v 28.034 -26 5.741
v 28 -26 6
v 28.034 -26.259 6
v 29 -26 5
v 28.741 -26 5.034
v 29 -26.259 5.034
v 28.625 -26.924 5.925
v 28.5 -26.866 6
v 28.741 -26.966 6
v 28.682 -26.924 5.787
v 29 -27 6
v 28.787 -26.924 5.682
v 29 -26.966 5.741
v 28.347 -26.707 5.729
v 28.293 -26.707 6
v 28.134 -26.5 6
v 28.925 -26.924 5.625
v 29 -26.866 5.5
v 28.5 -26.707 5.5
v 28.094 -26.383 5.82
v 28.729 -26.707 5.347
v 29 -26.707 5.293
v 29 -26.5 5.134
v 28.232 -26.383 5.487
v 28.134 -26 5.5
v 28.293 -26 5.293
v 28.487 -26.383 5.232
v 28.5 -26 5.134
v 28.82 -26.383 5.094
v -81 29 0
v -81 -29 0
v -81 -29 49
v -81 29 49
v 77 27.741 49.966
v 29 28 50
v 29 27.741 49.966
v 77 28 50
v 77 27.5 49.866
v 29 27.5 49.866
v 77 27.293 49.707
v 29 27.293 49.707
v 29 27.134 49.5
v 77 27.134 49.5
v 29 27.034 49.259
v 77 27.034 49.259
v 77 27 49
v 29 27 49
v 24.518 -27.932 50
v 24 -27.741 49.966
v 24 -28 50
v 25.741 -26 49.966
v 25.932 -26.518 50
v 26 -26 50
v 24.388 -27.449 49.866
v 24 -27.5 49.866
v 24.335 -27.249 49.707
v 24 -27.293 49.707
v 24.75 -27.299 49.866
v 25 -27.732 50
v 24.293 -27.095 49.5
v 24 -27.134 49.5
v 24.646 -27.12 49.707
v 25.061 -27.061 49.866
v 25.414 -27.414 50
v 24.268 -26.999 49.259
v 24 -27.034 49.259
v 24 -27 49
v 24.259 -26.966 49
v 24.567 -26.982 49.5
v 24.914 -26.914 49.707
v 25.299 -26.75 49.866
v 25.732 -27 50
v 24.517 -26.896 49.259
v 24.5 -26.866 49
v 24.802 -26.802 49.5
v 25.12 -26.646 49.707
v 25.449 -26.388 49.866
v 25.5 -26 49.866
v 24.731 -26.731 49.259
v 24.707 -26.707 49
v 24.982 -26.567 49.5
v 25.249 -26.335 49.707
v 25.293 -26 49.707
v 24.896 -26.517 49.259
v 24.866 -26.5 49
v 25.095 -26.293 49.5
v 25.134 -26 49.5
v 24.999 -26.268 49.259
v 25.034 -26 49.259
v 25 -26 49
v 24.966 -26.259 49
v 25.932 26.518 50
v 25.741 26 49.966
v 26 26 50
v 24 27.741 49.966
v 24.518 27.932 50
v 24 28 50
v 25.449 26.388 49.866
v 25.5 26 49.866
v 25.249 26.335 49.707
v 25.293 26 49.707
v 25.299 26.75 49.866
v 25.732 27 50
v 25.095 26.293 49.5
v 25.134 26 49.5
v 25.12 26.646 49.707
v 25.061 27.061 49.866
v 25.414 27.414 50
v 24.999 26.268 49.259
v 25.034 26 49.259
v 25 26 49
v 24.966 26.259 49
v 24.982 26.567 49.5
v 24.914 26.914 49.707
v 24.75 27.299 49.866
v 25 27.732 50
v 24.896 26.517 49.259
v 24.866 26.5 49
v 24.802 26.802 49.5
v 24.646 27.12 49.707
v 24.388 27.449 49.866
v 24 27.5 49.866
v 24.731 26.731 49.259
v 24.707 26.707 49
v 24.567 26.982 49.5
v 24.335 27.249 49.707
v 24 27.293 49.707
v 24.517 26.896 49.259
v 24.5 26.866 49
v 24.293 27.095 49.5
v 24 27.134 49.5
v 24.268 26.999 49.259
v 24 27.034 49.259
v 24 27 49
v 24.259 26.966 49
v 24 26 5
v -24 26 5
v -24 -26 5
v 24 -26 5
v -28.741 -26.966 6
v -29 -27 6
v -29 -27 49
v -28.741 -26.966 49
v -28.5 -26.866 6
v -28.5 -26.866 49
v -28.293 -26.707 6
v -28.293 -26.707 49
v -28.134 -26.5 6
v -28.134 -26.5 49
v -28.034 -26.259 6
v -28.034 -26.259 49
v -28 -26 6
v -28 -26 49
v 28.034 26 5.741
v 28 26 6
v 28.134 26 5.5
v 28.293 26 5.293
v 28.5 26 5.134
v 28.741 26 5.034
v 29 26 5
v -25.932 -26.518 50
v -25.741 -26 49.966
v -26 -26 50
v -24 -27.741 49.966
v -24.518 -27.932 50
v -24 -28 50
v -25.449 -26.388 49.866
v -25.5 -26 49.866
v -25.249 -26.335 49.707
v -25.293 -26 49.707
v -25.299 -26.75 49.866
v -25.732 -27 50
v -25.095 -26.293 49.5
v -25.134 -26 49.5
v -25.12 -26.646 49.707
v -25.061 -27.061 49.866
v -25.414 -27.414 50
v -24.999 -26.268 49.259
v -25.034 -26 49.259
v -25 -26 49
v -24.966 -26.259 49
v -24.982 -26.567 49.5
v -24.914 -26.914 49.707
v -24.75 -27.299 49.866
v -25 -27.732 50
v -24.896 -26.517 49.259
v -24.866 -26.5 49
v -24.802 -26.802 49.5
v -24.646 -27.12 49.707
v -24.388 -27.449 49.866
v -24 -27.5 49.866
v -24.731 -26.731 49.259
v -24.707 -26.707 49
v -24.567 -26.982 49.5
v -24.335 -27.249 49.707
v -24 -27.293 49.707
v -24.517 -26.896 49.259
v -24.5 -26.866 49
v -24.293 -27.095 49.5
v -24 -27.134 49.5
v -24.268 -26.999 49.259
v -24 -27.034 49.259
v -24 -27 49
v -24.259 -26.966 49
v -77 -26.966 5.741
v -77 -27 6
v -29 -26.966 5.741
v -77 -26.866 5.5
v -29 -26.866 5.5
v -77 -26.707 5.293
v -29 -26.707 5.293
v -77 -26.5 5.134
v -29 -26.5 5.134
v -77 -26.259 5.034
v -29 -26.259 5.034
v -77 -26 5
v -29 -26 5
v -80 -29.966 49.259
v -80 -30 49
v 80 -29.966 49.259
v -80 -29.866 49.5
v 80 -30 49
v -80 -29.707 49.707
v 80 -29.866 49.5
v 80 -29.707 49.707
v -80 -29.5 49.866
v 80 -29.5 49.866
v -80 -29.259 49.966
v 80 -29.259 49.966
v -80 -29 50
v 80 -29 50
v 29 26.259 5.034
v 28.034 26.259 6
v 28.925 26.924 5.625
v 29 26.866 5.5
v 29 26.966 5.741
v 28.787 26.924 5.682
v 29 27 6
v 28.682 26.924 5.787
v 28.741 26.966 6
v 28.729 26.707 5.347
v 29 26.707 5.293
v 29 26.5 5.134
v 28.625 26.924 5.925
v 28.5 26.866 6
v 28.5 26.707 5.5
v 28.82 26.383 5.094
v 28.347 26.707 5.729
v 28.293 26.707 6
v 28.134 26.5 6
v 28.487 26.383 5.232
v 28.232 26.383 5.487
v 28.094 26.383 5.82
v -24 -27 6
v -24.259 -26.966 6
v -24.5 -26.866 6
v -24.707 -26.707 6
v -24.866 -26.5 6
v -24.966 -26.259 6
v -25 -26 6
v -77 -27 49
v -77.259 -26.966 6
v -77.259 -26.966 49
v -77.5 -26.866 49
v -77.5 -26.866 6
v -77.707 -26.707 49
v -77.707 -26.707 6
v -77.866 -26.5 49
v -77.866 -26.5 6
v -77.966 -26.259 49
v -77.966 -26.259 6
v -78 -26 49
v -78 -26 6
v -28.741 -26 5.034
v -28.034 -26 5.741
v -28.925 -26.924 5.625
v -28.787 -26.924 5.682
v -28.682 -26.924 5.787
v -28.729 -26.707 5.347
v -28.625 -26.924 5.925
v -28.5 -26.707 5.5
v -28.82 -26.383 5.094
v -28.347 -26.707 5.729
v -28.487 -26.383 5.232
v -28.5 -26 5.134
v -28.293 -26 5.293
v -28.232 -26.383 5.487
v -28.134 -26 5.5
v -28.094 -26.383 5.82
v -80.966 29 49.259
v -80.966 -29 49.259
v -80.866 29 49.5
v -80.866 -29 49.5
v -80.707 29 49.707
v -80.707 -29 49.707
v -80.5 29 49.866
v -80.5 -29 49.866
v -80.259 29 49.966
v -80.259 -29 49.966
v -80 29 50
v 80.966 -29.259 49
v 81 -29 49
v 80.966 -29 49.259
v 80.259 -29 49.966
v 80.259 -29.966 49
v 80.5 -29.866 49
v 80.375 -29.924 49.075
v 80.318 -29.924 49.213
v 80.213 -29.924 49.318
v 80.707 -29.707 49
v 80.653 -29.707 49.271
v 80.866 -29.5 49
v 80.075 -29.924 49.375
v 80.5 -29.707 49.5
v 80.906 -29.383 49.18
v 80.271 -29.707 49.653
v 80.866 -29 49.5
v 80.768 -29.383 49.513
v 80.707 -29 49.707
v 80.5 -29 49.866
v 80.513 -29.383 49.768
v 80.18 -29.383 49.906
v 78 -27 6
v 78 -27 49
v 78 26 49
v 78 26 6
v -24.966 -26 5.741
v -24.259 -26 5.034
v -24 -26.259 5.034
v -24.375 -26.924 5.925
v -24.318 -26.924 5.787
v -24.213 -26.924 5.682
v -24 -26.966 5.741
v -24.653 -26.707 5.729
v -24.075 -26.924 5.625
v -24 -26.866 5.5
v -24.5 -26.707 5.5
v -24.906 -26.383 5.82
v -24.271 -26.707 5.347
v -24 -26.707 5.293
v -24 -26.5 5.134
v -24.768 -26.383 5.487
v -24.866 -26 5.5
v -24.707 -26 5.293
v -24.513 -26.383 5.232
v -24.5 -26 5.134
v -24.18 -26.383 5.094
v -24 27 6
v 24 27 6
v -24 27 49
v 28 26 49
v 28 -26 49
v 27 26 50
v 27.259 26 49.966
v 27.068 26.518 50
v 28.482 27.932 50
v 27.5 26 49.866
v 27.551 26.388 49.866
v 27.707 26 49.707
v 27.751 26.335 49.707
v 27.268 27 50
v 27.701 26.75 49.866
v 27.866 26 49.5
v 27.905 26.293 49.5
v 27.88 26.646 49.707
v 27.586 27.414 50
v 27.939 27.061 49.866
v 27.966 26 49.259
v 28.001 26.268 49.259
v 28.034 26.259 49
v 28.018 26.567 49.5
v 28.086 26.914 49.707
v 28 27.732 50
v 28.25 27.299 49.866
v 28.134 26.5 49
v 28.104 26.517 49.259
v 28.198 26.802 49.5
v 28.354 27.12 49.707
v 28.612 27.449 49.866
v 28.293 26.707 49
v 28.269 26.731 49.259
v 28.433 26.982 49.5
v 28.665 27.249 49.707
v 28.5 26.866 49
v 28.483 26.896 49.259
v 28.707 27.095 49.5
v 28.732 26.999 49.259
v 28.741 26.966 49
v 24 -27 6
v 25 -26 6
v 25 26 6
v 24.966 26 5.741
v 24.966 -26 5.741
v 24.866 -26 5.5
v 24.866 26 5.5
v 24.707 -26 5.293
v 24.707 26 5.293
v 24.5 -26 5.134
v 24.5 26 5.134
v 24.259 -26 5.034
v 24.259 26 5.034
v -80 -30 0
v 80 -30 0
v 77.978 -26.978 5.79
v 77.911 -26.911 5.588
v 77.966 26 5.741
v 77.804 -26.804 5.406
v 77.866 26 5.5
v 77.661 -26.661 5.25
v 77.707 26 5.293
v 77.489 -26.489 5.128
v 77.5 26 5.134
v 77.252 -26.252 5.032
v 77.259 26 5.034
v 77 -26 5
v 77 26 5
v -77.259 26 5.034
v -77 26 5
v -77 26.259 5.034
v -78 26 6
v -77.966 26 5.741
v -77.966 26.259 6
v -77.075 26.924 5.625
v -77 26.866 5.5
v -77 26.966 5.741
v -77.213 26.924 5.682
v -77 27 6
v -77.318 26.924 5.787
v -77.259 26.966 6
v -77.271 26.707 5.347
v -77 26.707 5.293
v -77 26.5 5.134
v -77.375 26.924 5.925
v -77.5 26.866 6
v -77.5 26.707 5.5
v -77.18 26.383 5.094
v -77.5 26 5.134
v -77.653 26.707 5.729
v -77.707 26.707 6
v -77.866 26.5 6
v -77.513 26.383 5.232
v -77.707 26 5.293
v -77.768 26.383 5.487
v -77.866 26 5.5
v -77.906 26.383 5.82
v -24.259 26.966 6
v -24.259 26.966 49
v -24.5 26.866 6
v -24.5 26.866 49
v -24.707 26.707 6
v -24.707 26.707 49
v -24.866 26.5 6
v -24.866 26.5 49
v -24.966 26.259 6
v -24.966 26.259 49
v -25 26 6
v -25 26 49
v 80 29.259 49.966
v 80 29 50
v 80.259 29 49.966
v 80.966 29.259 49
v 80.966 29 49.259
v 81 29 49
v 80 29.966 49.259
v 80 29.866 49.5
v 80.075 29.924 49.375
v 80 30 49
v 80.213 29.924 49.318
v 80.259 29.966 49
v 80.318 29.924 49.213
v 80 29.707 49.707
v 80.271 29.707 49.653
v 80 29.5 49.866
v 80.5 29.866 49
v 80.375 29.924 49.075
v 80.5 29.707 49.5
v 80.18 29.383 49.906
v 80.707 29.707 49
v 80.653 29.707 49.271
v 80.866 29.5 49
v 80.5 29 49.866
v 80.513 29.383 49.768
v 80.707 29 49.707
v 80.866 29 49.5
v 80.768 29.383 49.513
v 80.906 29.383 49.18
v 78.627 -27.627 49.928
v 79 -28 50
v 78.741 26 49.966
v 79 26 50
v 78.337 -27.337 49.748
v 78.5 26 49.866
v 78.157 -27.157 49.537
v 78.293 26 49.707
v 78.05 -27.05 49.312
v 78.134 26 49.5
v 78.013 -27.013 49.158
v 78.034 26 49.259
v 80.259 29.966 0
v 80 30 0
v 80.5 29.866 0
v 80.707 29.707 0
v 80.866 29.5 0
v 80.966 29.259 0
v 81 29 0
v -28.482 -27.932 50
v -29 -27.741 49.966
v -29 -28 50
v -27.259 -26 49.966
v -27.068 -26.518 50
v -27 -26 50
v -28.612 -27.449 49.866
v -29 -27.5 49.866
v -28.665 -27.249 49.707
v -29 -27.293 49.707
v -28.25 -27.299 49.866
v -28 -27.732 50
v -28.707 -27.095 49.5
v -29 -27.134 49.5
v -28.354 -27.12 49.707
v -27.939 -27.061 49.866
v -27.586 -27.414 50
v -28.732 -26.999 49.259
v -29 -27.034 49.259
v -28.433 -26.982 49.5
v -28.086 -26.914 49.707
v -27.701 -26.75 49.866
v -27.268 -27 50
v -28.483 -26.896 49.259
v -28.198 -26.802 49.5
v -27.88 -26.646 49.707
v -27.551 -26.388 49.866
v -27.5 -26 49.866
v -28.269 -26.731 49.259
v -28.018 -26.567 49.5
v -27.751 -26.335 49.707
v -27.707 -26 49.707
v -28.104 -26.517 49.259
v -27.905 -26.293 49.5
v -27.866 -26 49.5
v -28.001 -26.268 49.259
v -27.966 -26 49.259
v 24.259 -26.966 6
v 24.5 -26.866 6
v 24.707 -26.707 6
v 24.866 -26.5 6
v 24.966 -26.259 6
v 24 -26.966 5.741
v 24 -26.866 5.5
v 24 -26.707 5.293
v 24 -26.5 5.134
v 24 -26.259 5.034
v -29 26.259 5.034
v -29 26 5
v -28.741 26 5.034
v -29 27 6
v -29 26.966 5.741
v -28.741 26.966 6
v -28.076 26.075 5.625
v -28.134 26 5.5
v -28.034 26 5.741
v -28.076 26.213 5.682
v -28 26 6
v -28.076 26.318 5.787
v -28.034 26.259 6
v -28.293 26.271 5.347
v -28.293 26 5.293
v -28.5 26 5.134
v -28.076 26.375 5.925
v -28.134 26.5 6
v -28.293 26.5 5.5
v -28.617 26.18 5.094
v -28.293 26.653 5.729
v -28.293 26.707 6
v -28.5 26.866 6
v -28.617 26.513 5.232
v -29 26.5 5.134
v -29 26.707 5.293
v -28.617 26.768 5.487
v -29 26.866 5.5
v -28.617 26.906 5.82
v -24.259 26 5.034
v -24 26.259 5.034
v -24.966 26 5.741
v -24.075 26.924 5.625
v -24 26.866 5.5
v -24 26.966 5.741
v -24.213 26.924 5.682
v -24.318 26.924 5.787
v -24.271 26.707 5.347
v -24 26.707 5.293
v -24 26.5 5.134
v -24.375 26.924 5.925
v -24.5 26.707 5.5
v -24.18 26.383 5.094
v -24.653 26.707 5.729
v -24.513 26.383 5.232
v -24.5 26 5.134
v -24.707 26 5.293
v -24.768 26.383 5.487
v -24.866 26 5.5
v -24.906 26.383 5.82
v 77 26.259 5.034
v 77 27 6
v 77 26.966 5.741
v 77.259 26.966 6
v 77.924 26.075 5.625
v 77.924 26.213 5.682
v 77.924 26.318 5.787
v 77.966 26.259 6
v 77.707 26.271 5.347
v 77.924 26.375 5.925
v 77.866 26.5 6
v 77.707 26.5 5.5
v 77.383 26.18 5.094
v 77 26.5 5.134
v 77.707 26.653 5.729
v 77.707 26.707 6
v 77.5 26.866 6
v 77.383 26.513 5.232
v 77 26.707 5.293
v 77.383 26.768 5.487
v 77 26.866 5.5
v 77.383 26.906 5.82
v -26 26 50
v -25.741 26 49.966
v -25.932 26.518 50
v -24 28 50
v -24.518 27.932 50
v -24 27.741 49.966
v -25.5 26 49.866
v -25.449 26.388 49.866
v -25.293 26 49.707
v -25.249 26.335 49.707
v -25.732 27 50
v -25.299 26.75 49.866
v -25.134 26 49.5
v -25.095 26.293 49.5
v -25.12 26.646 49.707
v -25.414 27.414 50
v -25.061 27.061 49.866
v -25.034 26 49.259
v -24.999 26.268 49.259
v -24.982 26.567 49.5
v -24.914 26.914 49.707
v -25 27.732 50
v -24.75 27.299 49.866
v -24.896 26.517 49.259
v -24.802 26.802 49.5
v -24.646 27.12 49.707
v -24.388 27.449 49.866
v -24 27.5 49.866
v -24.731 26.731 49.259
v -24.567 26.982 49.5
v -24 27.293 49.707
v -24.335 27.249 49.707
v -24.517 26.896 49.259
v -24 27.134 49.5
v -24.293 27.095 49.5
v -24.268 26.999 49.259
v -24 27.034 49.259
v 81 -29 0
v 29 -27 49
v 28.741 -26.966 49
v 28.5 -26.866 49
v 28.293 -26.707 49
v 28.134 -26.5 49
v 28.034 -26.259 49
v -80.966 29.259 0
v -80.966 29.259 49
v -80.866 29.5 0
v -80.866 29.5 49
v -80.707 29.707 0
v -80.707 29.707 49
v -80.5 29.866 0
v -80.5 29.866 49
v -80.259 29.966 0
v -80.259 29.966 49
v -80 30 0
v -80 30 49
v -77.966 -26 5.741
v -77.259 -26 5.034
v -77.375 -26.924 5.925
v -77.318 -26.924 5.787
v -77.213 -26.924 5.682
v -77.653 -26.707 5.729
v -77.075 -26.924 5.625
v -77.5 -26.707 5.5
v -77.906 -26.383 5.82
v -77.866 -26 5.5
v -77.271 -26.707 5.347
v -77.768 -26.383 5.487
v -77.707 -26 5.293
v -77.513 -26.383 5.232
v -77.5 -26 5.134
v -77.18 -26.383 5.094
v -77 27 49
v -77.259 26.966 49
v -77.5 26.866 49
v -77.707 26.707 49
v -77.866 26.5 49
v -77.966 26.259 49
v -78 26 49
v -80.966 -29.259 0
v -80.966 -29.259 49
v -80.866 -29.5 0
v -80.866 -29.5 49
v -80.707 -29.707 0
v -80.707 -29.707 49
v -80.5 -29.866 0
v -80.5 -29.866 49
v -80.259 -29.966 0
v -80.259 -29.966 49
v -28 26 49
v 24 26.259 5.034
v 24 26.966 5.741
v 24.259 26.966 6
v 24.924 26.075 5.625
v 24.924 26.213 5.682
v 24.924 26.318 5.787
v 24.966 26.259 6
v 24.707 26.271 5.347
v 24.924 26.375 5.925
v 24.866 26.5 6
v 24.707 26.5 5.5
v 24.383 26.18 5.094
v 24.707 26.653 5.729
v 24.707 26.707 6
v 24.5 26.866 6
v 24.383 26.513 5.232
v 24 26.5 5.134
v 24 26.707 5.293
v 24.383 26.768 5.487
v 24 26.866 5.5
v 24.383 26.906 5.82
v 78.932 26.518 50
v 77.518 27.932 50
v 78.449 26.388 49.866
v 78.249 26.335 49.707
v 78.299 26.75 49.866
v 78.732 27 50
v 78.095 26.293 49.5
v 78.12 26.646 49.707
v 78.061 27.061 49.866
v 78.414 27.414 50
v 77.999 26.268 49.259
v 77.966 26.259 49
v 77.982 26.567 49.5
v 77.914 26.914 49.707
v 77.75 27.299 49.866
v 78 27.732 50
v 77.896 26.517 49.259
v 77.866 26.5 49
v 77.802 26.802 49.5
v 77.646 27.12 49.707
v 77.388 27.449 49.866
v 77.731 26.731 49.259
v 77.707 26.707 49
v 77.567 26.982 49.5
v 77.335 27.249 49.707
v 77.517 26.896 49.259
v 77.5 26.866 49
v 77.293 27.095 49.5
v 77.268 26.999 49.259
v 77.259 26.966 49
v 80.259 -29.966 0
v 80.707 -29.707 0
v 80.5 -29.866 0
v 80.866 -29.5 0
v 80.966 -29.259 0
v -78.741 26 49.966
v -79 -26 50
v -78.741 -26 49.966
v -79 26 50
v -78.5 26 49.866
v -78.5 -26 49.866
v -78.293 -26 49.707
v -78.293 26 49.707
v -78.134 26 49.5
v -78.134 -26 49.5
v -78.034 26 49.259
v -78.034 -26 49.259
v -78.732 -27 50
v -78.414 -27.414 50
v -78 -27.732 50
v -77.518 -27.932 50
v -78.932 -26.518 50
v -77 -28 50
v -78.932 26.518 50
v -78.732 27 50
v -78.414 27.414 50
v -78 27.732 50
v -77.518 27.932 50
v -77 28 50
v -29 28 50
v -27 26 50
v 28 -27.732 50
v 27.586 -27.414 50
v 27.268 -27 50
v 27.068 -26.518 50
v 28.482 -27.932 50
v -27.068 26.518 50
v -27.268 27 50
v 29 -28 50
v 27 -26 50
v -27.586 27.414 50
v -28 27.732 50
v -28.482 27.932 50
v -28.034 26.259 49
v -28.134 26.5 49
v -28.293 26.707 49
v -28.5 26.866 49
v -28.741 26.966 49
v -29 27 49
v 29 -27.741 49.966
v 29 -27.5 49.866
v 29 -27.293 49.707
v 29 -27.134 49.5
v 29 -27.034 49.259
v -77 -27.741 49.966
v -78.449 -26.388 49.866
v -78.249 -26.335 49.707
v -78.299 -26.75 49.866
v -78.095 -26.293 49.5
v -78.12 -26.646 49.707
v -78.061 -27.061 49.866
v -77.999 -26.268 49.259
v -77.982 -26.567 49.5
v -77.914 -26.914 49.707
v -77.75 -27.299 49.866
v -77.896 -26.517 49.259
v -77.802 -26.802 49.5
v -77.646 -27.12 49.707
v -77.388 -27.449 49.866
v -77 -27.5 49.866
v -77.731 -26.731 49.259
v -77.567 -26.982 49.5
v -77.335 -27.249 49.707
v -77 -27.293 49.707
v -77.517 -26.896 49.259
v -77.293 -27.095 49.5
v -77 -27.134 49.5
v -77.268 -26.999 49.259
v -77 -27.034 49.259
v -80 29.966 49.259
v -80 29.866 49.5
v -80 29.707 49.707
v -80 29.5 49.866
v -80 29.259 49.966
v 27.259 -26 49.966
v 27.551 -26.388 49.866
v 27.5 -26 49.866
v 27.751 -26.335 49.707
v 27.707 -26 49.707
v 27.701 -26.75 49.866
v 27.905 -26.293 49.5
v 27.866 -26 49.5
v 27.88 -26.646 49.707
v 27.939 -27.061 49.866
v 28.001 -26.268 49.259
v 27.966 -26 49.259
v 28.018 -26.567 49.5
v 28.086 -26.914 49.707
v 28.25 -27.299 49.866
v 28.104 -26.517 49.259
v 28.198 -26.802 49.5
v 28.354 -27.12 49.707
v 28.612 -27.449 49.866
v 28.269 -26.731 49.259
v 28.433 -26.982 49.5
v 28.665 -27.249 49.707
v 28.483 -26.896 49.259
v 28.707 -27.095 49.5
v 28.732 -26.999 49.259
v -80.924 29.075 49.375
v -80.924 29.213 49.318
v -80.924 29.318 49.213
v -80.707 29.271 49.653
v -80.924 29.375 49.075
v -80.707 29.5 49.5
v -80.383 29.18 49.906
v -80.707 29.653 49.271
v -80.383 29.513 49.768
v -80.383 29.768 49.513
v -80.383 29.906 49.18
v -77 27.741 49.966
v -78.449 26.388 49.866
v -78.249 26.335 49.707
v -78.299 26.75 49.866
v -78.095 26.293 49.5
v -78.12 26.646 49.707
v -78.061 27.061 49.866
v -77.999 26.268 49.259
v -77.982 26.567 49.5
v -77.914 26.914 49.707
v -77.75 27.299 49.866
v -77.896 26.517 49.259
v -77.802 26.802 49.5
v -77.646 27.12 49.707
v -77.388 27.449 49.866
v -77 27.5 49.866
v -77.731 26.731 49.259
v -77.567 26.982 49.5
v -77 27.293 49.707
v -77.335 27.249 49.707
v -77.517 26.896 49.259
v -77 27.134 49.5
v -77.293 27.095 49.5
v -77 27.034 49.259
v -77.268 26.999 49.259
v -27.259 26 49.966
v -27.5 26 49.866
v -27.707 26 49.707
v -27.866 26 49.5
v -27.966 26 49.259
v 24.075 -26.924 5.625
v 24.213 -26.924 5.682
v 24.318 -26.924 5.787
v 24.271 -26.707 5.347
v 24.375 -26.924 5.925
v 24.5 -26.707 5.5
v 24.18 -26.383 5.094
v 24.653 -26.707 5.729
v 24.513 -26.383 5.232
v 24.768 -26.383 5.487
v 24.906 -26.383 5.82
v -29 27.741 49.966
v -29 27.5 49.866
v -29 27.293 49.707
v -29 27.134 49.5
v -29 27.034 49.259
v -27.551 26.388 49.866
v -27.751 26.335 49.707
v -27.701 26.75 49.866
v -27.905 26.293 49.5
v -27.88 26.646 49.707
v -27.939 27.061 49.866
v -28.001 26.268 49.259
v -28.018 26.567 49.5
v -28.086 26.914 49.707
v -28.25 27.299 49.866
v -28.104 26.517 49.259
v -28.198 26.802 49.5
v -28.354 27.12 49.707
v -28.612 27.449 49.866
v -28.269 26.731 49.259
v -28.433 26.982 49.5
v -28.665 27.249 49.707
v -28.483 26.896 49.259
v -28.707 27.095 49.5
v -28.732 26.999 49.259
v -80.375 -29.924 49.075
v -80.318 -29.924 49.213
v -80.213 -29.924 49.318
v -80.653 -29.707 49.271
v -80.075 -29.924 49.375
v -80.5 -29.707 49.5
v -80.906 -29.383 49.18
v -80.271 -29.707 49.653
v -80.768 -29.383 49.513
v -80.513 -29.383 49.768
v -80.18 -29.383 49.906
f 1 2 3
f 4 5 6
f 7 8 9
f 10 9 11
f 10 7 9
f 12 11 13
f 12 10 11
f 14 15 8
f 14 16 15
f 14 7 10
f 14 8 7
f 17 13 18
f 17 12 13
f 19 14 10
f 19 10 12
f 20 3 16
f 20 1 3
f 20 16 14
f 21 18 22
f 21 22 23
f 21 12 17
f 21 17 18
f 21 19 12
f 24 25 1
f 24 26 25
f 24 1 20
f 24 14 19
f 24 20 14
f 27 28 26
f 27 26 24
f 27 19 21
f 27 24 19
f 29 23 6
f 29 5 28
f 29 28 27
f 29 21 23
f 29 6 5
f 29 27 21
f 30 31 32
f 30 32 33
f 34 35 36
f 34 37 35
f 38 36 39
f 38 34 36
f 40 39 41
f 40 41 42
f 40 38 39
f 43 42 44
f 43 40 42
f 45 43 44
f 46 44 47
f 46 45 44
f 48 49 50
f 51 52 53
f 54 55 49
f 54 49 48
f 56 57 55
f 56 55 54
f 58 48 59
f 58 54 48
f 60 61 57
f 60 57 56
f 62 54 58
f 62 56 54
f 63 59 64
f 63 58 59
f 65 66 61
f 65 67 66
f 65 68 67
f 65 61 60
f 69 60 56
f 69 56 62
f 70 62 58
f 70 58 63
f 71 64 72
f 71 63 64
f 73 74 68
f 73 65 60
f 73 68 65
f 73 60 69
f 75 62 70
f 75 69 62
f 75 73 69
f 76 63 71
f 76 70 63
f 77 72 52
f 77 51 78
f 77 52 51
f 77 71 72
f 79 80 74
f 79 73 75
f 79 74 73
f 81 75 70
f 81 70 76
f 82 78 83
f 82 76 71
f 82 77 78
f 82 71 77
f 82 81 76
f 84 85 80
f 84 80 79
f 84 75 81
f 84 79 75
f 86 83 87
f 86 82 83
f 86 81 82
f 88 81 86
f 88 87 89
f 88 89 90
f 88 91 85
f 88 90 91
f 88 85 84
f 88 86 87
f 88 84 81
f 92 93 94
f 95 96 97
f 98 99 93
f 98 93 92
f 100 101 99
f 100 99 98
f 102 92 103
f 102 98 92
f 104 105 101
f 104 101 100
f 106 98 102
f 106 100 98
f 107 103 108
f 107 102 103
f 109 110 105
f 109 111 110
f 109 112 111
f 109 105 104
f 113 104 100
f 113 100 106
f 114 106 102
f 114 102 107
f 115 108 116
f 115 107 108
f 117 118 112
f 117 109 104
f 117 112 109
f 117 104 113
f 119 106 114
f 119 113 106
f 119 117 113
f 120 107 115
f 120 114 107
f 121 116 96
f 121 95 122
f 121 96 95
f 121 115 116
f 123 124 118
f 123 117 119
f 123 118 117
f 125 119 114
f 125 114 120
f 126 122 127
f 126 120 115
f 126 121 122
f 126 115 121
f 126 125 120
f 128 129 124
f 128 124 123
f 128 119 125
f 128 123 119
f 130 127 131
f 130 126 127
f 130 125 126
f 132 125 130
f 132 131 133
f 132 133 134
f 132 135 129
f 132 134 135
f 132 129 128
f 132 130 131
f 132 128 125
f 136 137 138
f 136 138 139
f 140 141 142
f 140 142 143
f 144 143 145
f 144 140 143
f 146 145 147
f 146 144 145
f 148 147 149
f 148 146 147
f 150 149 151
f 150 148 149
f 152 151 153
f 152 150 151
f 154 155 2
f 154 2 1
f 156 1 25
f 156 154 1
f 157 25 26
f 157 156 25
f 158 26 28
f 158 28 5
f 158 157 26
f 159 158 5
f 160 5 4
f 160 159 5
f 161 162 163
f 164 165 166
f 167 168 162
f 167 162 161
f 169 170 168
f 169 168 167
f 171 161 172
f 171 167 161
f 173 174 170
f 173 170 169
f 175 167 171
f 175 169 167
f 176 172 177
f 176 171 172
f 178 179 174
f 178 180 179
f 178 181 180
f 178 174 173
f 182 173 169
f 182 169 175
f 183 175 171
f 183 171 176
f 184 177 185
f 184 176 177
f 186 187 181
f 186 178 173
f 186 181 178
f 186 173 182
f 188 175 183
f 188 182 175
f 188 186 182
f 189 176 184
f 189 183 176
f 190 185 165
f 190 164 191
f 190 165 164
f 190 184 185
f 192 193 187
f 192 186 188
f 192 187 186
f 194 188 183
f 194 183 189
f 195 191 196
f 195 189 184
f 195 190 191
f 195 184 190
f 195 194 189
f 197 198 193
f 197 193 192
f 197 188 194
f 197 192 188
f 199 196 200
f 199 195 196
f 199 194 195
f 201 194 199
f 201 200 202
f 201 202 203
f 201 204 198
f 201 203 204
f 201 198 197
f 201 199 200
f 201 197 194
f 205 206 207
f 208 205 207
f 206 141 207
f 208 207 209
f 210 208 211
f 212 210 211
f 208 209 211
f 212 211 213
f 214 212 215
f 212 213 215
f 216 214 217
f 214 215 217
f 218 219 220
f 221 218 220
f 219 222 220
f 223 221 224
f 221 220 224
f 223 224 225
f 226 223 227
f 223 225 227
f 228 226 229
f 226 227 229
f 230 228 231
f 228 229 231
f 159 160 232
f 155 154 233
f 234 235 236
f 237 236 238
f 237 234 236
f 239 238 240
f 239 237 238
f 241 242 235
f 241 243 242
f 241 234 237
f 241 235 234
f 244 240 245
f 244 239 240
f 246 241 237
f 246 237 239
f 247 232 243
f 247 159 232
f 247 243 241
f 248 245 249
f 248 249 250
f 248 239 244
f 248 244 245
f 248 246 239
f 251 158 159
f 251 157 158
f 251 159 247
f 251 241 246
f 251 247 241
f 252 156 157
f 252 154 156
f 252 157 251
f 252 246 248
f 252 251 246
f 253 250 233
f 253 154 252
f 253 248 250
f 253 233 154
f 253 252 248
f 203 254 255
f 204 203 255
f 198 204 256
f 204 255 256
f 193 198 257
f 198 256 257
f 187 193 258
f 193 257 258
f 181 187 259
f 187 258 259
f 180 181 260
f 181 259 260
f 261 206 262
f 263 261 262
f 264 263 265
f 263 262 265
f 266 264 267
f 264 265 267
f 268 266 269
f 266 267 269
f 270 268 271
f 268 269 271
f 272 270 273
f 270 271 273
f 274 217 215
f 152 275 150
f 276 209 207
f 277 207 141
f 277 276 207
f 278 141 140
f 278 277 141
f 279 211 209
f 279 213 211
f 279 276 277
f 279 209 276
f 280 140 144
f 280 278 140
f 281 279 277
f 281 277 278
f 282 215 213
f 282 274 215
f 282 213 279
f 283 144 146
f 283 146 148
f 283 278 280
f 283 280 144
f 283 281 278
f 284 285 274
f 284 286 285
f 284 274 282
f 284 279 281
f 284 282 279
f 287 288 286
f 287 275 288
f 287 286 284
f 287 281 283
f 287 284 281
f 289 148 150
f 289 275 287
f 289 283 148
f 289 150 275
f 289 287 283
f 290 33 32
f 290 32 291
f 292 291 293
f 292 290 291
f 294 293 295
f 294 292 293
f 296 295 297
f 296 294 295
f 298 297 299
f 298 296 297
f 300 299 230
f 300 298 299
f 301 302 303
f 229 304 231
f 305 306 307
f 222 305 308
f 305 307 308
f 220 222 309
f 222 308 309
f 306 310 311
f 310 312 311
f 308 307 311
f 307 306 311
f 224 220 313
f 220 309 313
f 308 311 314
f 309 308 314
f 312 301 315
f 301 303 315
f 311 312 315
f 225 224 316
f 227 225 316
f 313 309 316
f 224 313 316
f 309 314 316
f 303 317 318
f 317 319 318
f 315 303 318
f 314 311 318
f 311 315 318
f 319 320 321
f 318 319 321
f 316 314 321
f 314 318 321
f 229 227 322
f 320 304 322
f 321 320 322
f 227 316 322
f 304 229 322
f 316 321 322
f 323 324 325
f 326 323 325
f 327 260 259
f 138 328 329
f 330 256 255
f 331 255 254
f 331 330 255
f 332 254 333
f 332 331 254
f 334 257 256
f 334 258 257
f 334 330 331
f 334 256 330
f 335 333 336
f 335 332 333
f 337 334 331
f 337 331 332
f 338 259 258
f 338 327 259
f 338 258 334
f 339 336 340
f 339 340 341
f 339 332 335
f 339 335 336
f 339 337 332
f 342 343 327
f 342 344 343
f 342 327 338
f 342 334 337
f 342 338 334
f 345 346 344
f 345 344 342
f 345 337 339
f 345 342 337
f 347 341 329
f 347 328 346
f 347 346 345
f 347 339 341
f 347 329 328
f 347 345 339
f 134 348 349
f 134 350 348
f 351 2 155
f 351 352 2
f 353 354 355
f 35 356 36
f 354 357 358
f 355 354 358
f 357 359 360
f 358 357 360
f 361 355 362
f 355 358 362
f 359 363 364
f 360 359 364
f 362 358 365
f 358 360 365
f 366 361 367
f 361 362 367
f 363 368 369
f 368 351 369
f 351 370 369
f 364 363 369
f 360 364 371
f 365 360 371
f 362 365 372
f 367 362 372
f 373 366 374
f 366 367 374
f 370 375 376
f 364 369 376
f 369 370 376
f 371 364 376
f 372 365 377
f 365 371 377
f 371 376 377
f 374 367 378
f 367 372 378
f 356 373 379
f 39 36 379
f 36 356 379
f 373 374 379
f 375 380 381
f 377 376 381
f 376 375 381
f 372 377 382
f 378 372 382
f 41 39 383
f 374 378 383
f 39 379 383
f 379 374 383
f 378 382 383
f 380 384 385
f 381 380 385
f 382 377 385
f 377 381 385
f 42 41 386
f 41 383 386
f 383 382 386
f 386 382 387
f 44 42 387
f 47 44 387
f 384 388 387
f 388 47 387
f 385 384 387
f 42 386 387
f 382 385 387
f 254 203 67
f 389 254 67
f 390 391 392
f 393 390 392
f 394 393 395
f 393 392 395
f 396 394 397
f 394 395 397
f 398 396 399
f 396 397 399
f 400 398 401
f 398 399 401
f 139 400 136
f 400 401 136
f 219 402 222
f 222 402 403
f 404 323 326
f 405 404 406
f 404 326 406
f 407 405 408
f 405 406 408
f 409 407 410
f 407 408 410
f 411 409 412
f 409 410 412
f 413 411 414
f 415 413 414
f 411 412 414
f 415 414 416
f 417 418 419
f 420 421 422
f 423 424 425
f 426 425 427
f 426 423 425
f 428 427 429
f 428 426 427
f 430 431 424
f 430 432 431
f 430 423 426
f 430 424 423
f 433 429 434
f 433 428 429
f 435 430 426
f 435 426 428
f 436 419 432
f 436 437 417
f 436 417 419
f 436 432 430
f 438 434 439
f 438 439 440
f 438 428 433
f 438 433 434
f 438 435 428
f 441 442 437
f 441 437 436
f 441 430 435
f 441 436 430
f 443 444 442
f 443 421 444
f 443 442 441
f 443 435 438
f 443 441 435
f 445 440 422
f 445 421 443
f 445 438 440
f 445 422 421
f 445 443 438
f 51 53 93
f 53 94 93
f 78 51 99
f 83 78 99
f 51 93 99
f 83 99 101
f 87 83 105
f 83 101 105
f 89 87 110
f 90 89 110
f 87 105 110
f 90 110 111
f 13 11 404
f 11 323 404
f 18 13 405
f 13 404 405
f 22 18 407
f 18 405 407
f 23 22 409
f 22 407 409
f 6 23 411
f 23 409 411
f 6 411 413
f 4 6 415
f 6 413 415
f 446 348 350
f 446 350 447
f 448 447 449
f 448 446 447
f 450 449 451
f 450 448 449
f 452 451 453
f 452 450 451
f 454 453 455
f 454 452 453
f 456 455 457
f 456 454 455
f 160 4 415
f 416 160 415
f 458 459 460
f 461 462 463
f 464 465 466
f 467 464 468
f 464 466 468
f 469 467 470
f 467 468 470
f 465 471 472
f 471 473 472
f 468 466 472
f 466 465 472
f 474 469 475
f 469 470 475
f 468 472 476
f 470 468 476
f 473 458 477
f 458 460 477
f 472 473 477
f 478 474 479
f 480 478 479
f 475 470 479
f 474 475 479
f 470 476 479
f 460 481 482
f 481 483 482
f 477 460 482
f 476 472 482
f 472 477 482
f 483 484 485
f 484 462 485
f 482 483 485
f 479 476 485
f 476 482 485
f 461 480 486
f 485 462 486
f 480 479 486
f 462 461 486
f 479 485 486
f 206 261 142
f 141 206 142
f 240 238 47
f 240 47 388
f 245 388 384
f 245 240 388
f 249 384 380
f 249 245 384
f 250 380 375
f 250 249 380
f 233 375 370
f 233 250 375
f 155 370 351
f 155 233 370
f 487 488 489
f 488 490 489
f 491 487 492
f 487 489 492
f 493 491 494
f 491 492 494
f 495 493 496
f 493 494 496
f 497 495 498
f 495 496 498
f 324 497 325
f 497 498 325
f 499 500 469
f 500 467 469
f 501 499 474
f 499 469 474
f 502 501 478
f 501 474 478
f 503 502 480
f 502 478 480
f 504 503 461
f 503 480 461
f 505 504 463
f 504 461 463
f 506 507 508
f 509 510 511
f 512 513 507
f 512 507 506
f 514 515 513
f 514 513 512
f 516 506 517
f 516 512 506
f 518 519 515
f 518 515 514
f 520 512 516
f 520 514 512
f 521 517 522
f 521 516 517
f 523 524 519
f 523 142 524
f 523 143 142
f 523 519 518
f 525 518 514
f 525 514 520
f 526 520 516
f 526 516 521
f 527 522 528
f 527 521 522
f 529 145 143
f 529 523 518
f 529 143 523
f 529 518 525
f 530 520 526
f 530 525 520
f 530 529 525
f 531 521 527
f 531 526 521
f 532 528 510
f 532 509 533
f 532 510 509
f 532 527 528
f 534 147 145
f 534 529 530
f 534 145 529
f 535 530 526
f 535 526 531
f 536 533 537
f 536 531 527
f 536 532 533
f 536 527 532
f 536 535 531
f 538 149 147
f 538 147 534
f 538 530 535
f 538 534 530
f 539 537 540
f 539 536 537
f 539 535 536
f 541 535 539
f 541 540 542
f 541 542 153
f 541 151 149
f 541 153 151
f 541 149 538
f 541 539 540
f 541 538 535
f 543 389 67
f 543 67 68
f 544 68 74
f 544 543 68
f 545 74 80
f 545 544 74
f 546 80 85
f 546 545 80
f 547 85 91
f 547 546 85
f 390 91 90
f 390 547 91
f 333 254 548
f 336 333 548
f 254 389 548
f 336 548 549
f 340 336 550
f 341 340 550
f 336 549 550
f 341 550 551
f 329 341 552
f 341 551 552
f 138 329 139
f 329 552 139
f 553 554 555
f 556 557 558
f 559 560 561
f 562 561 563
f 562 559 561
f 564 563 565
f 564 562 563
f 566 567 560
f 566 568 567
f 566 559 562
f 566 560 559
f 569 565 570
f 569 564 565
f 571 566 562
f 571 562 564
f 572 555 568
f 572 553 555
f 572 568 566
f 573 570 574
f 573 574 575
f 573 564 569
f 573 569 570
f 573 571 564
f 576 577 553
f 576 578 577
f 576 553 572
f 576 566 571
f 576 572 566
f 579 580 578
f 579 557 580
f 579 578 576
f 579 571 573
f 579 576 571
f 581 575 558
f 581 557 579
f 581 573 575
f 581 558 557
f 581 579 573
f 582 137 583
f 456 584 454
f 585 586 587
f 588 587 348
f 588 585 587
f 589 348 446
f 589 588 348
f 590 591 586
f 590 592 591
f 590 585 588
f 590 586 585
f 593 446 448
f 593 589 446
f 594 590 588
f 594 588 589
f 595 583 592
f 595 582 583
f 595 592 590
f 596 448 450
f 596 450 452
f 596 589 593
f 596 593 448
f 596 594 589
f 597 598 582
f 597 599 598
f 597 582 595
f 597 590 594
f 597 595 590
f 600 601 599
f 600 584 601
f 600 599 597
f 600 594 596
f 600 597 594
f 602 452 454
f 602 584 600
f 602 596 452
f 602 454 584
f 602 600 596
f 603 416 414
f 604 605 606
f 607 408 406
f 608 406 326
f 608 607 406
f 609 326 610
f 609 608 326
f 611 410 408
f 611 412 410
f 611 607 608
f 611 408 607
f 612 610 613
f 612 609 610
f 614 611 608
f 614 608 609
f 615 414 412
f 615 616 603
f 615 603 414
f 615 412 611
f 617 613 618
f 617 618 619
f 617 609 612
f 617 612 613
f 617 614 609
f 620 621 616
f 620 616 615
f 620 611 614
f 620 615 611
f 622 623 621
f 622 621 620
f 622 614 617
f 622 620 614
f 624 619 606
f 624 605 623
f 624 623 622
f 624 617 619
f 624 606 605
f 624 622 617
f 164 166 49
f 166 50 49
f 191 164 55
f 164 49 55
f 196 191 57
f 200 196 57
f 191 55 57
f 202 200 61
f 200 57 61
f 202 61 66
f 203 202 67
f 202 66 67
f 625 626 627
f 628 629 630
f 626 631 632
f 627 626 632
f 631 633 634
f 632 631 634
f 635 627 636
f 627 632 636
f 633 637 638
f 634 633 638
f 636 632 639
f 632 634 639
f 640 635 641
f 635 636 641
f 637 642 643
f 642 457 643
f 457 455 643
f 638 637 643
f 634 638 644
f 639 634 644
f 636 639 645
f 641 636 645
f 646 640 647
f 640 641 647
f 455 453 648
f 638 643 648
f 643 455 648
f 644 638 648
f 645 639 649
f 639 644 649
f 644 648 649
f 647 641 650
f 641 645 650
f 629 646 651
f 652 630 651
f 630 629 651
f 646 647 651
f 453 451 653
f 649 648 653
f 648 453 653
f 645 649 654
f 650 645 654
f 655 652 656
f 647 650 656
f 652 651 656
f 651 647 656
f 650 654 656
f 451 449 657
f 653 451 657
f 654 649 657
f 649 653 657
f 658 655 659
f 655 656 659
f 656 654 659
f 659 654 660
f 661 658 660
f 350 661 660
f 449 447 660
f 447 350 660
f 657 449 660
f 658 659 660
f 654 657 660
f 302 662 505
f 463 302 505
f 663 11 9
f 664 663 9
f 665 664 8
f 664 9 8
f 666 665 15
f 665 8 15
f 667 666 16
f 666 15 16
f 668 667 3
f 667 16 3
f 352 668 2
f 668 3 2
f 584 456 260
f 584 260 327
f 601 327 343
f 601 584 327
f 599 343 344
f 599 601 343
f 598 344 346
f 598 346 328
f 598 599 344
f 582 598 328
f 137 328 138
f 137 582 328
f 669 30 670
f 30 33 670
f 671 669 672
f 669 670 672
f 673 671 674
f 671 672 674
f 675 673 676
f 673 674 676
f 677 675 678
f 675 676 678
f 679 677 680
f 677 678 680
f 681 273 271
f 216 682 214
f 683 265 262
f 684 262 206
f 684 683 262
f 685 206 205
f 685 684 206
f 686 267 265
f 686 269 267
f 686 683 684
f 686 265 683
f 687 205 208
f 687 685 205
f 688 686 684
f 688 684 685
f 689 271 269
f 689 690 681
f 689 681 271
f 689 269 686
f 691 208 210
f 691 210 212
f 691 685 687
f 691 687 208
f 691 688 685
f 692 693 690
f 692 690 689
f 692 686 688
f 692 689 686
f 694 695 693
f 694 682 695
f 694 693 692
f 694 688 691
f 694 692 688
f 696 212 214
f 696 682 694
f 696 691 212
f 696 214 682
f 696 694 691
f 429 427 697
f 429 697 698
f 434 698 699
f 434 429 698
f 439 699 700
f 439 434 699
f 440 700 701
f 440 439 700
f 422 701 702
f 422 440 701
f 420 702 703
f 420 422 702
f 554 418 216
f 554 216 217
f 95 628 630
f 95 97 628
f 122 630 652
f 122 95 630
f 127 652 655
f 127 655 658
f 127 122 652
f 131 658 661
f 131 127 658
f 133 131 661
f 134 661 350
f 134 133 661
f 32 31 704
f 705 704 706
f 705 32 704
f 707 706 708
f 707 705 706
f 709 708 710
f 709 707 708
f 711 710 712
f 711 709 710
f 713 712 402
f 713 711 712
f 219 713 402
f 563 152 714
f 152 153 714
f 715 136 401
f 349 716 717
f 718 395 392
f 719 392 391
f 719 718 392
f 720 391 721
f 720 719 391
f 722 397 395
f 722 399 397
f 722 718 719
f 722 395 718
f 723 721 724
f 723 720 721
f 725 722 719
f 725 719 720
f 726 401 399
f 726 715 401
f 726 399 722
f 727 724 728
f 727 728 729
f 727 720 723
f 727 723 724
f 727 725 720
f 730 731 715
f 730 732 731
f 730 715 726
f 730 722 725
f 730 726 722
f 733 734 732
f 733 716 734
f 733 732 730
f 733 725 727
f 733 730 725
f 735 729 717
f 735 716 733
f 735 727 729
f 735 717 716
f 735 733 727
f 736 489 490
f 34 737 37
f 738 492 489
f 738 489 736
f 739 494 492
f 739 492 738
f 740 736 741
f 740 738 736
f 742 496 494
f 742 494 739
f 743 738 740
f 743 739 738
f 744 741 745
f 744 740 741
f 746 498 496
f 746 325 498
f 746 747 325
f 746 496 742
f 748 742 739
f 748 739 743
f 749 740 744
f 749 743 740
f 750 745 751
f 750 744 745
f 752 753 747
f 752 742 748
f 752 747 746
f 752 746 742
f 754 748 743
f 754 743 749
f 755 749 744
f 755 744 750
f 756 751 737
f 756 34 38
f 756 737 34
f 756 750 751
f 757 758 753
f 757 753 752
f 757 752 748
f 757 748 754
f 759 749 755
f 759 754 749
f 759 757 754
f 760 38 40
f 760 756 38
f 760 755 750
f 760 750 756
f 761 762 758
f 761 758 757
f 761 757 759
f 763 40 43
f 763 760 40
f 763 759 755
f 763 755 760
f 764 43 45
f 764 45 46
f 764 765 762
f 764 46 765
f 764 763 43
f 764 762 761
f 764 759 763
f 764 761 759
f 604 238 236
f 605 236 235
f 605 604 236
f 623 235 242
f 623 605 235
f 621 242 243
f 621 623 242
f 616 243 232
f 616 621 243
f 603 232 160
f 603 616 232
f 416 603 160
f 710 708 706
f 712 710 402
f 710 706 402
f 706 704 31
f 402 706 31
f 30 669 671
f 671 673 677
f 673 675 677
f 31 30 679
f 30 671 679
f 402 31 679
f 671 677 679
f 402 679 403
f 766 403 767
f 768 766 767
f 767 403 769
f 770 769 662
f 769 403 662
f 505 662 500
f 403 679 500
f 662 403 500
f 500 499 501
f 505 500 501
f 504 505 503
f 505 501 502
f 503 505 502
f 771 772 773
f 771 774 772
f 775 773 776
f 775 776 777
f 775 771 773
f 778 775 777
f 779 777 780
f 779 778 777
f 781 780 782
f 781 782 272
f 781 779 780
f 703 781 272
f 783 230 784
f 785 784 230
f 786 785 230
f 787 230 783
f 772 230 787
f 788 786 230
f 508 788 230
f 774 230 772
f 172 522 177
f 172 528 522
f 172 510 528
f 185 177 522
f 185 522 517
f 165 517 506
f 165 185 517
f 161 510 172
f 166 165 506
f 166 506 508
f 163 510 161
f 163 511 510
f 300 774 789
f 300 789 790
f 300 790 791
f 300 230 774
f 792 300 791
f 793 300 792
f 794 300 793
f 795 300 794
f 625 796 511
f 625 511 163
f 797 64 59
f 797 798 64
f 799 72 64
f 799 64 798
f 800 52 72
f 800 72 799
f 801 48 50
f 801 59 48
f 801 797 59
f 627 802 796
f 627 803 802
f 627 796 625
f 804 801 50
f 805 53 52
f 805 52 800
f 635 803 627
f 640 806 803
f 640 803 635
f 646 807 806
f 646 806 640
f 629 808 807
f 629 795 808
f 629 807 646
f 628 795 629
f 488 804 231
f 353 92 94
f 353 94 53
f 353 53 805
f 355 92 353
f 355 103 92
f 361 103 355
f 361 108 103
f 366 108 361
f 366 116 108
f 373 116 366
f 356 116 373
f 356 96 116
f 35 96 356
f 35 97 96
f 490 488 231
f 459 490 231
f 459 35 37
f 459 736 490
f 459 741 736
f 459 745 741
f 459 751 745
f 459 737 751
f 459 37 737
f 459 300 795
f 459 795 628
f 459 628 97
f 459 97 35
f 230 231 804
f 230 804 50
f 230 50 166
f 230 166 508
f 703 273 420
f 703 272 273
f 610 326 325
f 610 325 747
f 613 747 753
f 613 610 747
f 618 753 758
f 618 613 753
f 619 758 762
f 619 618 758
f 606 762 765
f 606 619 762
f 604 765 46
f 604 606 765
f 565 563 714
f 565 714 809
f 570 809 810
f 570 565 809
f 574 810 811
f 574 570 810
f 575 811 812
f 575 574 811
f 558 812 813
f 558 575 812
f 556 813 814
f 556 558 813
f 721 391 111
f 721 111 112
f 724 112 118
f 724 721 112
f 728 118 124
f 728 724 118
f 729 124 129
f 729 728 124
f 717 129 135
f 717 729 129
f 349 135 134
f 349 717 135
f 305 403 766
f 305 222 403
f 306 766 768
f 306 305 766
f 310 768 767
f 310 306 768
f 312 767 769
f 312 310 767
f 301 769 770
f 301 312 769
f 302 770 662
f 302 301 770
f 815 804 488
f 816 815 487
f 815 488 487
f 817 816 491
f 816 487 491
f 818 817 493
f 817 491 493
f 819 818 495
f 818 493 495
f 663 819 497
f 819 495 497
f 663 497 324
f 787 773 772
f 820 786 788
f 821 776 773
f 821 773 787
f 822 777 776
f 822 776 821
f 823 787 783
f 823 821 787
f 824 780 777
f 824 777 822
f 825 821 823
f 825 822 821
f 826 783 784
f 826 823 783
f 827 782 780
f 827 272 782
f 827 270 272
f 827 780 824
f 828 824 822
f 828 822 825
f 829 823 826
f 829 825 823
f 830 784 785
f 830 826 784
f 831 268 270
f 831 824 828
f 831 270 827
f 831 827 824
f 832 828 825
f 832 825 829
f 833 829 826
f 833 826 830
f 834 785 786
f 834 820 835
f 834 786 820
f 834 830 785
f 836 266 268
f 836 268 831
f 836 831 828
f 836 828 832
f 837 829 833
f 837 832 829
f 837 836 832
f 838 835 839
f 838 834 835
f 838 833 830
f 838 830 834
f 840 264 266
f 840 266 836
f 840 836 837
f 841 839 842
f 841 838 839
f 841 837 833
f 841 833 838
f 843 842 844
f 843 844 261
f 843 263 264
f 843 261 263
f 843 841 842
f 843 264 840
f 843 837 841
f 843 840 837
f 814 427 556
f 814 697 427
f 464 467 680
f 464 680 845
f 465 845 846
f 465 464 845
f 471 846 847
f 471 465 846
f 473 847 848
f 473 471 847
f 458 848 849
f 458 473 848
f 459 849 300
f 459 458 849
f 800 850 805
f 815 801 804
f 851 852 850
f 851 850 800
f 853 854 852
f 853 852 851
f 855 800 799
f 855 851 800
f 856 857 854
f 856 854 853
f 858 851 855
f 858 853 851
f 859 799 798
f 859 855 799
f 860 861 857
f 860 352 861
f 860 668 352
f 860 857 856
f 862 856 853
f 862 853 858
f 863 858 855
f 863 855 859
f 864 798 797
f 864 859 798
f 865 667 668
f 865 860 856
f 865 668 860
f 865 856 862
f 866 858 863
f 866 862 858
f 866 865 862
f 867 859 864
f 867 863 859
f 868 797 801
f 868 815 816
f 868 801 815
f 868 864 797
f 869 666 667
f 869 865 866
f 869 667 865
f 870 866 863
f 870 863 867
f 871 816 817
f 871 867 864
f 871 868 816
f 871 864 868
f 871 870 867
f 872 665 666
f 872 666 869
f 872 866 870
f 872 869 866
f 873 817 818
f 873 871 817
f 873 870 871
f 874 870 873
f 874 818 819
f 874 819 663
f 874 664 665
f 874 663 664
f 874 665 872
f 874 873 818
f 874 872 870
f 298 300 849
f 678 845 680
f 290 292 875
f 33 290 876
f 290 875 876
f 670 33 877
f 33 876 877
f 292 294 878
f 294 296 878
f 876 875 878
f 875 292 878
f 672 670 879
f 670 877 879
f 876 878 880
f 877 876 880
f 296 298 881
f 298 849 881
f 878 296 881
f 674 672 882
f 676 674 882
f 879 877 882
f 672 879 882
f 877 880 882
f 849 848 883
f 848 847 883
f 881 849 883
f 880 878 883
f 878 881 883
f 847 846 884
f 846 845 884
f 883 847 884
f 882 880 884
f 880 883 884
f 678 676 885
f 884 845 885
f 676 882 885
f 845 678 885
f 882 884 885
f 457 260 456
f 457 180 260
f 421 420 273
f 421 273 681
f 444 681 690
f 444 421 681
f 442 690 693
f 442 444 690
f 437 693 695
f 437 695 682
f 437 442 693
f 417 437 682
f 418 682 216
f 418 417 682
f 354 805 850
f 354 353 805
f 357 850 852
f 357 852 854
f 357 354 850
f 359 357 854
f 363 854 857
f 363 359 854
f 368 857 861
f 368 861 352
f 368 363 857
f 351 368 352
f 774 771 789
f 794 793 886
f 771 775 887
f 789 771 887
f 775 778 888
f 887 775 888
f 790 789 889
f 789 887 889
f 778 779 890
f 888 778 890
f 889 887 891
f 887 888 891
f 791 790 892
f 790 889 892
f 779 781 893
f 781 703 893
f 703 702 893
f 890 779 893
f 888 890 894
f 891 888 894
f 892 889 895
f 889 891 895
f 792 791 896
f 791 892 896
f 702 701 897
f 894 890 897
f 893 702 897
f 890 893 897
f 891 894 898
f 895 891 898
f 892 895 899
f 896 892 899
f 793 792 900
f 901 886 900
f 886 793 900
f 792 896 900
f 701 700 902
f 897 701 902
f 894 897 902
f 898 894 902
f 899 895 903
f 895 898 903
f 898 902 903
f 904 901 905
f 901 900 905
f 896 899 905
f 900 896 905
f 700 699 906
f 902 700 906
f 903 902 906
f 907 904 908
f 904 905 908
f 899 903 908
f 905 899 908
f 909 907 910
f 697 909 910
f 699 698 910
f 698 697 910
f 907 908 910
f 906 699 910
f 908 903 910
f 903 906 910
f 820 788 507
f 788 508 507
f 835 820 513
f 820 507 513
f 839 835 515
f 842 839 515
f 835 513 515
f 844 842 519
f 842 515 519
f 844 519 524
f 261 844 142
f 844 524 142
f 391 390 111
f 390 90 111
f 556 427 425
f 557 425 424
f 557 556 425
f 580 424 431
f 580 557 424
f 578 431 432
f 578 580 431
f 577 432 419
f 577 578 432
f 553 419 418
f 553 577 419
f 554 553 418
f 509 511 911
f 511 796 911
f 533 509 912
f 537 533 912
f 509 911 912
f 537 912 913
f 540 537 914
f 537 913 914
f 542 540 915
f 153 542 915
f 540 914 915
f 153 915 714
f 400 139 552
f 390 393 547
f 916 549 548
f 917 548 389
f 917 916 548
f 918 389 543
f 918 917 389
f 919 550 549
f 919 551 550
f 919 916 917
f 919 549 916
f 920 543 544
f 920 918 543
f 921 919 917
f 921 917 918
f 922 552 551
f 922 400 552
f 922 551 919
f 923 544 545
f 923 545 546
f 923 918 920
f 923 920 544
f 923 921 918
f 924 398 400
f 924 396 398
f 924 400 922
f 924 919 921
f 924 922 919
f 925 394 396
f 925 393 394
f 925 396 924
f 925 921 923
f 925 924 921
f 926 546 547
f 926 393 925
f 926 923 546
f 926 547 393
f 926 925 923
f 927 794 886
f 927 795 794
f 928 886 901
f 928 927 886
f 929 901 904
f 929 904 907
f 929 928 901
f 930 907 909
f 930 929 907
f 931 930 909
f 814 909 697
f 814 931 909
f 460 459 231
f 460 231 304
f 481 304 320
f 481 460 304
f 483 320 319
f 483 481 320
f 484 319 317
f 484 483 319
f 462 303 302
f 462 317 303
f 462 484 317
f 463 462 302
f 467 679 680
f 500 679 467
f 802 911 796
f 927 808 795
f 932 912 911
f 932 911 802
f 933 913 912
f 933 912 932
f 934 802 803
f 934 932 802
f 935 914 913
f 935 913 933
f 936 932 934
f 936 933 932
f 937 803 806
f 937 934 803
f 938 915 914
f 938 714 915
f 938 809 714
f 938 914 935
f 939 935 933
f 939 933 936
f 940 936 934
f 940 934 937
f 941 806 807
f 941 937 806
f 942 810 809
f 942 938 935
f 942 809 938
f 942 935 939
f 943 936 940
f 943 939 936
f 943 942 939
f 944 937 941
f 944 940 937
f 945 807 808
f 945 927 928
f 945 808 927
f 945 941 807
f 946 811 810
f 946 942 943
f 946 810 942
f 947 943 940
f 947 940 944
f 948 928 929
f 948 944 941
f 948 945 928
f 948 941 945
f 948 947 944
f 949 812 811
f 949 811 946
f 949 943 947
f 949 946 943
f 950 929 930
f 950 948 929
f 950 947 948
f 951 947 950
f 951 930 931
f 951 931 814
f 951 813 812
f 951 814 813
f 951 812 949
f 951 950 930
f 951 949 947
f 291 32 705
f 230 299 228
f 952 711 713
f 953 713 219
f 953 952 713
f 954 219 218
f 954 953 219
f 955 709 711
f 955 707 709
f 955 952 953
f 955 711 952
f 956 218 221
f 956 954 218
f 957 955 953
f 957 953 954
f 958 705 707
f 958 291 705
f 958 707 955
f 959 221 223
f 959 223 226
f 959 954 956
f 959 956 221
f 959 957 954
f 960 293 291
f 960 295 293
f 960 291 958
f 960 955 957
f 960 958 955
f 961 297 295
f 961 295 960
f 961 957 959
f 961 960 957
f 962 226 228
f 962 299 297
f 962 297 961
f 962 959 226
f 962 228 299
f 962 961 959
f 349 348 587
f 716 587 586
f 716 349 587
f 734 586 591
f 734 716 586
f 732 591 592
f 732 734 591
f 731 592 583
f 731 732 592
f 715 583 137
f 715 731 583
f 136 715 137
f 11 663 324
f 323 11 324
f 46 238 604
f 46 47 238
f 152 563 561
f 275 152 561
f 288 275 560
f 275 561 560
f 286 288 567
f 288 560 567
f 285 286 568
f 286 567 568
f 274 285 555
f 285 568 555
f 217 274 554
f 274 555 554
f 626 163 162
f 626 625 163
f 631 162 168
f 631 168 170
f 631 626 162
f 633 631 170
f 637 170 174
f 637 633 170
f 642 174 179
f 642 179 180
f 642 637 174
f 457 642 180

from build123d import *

# Parameters (mm, degrees)
SKETCH1_W           = 162
SKETCH1_H           = 60
BOSS_EXTRUDE1_DEPTH = 50
SKETCH2_W           = 50
SKETCH2_H           = 54
CUT_EXTRUDE1_DEPTH  = 45
FILLET1_R           = 1


with BuildPart() as part:
    # Sketch1 → Boss-Extrude1 (new body)
    with BuildSketch(Plane.XY):
        Rectangle(SKETCH1_W, SKETCH1_H)
    extrude(amount=BOSS_EXTRUDE1_DEPTH)

    # Sketch2 → Cut-Extrude1 (cut)
    with BuildSketch(Plane.XY.offset(50)):
        with Locations((-53, 0)):
            Rectangle(SKETCH2_W, SKETCH2_H)
        Rectangle(SKETCH2_W, SKETCH2_H)
        with Locations((53, 0)):
            Rectangle(SKETCH2_W, SKETCH2_H)
    extrude(amount=-CUT_EXTRUDE1_DEPTH, mode=Mode.SUBTRACT)

    # Fillet1
    fillet1_edges = [part.edges().sort_by_distance(p)[0] for p in [
        (81, 0, 50),
        (0, 30, 50),
        (-78, 0, 5),
        (-78, -27, 27.5),
        (-53, 27, 5),
        (-78, 27, 27.5),
        (-28, 0, 5),
        (-28, 27, 27.5),
        (-53, -27, 5),
        (-28, -27, 27.5),
        (-78, 0, 50),
        (-53, -27, 50),
        (-28, 0, 50),
        (-53, 27, 50),
        (-25, 0, 5),
        (-25, -27, 27.5),
        (0, 27, 5),
        (-25, 27, 27.5),
        (25, 0, 5),
        (25, 27, 27.5),
        (0, -27, 5),
        (25, -27, 27.5),
        (-25, 0, 50),
        (0, -27, 50),
        (25, 0, 50),
        (0, 27, 50),
        (28, 0, 5),
        (28, -27, 27.5),
        (53, 27, 5),
        (28, 27, 27.5),
        (78, 0, 5),
        (78, 27, 27.5),
        (53, -27, 5),
        (28, 0, 50),
        (53, -27, 50),
        (78, 0, 50),
        (53, 27, 50),
        (-81, 0, 50),
        (-81, 30, 25),
        (81, 30, 25),
        (81, -30, 25),
        (-81, -30, 25),
        (0, -30, 50),
    ]]
    fillet(fillet1_edges, radius=FILLET1_R)


solid = part.part
